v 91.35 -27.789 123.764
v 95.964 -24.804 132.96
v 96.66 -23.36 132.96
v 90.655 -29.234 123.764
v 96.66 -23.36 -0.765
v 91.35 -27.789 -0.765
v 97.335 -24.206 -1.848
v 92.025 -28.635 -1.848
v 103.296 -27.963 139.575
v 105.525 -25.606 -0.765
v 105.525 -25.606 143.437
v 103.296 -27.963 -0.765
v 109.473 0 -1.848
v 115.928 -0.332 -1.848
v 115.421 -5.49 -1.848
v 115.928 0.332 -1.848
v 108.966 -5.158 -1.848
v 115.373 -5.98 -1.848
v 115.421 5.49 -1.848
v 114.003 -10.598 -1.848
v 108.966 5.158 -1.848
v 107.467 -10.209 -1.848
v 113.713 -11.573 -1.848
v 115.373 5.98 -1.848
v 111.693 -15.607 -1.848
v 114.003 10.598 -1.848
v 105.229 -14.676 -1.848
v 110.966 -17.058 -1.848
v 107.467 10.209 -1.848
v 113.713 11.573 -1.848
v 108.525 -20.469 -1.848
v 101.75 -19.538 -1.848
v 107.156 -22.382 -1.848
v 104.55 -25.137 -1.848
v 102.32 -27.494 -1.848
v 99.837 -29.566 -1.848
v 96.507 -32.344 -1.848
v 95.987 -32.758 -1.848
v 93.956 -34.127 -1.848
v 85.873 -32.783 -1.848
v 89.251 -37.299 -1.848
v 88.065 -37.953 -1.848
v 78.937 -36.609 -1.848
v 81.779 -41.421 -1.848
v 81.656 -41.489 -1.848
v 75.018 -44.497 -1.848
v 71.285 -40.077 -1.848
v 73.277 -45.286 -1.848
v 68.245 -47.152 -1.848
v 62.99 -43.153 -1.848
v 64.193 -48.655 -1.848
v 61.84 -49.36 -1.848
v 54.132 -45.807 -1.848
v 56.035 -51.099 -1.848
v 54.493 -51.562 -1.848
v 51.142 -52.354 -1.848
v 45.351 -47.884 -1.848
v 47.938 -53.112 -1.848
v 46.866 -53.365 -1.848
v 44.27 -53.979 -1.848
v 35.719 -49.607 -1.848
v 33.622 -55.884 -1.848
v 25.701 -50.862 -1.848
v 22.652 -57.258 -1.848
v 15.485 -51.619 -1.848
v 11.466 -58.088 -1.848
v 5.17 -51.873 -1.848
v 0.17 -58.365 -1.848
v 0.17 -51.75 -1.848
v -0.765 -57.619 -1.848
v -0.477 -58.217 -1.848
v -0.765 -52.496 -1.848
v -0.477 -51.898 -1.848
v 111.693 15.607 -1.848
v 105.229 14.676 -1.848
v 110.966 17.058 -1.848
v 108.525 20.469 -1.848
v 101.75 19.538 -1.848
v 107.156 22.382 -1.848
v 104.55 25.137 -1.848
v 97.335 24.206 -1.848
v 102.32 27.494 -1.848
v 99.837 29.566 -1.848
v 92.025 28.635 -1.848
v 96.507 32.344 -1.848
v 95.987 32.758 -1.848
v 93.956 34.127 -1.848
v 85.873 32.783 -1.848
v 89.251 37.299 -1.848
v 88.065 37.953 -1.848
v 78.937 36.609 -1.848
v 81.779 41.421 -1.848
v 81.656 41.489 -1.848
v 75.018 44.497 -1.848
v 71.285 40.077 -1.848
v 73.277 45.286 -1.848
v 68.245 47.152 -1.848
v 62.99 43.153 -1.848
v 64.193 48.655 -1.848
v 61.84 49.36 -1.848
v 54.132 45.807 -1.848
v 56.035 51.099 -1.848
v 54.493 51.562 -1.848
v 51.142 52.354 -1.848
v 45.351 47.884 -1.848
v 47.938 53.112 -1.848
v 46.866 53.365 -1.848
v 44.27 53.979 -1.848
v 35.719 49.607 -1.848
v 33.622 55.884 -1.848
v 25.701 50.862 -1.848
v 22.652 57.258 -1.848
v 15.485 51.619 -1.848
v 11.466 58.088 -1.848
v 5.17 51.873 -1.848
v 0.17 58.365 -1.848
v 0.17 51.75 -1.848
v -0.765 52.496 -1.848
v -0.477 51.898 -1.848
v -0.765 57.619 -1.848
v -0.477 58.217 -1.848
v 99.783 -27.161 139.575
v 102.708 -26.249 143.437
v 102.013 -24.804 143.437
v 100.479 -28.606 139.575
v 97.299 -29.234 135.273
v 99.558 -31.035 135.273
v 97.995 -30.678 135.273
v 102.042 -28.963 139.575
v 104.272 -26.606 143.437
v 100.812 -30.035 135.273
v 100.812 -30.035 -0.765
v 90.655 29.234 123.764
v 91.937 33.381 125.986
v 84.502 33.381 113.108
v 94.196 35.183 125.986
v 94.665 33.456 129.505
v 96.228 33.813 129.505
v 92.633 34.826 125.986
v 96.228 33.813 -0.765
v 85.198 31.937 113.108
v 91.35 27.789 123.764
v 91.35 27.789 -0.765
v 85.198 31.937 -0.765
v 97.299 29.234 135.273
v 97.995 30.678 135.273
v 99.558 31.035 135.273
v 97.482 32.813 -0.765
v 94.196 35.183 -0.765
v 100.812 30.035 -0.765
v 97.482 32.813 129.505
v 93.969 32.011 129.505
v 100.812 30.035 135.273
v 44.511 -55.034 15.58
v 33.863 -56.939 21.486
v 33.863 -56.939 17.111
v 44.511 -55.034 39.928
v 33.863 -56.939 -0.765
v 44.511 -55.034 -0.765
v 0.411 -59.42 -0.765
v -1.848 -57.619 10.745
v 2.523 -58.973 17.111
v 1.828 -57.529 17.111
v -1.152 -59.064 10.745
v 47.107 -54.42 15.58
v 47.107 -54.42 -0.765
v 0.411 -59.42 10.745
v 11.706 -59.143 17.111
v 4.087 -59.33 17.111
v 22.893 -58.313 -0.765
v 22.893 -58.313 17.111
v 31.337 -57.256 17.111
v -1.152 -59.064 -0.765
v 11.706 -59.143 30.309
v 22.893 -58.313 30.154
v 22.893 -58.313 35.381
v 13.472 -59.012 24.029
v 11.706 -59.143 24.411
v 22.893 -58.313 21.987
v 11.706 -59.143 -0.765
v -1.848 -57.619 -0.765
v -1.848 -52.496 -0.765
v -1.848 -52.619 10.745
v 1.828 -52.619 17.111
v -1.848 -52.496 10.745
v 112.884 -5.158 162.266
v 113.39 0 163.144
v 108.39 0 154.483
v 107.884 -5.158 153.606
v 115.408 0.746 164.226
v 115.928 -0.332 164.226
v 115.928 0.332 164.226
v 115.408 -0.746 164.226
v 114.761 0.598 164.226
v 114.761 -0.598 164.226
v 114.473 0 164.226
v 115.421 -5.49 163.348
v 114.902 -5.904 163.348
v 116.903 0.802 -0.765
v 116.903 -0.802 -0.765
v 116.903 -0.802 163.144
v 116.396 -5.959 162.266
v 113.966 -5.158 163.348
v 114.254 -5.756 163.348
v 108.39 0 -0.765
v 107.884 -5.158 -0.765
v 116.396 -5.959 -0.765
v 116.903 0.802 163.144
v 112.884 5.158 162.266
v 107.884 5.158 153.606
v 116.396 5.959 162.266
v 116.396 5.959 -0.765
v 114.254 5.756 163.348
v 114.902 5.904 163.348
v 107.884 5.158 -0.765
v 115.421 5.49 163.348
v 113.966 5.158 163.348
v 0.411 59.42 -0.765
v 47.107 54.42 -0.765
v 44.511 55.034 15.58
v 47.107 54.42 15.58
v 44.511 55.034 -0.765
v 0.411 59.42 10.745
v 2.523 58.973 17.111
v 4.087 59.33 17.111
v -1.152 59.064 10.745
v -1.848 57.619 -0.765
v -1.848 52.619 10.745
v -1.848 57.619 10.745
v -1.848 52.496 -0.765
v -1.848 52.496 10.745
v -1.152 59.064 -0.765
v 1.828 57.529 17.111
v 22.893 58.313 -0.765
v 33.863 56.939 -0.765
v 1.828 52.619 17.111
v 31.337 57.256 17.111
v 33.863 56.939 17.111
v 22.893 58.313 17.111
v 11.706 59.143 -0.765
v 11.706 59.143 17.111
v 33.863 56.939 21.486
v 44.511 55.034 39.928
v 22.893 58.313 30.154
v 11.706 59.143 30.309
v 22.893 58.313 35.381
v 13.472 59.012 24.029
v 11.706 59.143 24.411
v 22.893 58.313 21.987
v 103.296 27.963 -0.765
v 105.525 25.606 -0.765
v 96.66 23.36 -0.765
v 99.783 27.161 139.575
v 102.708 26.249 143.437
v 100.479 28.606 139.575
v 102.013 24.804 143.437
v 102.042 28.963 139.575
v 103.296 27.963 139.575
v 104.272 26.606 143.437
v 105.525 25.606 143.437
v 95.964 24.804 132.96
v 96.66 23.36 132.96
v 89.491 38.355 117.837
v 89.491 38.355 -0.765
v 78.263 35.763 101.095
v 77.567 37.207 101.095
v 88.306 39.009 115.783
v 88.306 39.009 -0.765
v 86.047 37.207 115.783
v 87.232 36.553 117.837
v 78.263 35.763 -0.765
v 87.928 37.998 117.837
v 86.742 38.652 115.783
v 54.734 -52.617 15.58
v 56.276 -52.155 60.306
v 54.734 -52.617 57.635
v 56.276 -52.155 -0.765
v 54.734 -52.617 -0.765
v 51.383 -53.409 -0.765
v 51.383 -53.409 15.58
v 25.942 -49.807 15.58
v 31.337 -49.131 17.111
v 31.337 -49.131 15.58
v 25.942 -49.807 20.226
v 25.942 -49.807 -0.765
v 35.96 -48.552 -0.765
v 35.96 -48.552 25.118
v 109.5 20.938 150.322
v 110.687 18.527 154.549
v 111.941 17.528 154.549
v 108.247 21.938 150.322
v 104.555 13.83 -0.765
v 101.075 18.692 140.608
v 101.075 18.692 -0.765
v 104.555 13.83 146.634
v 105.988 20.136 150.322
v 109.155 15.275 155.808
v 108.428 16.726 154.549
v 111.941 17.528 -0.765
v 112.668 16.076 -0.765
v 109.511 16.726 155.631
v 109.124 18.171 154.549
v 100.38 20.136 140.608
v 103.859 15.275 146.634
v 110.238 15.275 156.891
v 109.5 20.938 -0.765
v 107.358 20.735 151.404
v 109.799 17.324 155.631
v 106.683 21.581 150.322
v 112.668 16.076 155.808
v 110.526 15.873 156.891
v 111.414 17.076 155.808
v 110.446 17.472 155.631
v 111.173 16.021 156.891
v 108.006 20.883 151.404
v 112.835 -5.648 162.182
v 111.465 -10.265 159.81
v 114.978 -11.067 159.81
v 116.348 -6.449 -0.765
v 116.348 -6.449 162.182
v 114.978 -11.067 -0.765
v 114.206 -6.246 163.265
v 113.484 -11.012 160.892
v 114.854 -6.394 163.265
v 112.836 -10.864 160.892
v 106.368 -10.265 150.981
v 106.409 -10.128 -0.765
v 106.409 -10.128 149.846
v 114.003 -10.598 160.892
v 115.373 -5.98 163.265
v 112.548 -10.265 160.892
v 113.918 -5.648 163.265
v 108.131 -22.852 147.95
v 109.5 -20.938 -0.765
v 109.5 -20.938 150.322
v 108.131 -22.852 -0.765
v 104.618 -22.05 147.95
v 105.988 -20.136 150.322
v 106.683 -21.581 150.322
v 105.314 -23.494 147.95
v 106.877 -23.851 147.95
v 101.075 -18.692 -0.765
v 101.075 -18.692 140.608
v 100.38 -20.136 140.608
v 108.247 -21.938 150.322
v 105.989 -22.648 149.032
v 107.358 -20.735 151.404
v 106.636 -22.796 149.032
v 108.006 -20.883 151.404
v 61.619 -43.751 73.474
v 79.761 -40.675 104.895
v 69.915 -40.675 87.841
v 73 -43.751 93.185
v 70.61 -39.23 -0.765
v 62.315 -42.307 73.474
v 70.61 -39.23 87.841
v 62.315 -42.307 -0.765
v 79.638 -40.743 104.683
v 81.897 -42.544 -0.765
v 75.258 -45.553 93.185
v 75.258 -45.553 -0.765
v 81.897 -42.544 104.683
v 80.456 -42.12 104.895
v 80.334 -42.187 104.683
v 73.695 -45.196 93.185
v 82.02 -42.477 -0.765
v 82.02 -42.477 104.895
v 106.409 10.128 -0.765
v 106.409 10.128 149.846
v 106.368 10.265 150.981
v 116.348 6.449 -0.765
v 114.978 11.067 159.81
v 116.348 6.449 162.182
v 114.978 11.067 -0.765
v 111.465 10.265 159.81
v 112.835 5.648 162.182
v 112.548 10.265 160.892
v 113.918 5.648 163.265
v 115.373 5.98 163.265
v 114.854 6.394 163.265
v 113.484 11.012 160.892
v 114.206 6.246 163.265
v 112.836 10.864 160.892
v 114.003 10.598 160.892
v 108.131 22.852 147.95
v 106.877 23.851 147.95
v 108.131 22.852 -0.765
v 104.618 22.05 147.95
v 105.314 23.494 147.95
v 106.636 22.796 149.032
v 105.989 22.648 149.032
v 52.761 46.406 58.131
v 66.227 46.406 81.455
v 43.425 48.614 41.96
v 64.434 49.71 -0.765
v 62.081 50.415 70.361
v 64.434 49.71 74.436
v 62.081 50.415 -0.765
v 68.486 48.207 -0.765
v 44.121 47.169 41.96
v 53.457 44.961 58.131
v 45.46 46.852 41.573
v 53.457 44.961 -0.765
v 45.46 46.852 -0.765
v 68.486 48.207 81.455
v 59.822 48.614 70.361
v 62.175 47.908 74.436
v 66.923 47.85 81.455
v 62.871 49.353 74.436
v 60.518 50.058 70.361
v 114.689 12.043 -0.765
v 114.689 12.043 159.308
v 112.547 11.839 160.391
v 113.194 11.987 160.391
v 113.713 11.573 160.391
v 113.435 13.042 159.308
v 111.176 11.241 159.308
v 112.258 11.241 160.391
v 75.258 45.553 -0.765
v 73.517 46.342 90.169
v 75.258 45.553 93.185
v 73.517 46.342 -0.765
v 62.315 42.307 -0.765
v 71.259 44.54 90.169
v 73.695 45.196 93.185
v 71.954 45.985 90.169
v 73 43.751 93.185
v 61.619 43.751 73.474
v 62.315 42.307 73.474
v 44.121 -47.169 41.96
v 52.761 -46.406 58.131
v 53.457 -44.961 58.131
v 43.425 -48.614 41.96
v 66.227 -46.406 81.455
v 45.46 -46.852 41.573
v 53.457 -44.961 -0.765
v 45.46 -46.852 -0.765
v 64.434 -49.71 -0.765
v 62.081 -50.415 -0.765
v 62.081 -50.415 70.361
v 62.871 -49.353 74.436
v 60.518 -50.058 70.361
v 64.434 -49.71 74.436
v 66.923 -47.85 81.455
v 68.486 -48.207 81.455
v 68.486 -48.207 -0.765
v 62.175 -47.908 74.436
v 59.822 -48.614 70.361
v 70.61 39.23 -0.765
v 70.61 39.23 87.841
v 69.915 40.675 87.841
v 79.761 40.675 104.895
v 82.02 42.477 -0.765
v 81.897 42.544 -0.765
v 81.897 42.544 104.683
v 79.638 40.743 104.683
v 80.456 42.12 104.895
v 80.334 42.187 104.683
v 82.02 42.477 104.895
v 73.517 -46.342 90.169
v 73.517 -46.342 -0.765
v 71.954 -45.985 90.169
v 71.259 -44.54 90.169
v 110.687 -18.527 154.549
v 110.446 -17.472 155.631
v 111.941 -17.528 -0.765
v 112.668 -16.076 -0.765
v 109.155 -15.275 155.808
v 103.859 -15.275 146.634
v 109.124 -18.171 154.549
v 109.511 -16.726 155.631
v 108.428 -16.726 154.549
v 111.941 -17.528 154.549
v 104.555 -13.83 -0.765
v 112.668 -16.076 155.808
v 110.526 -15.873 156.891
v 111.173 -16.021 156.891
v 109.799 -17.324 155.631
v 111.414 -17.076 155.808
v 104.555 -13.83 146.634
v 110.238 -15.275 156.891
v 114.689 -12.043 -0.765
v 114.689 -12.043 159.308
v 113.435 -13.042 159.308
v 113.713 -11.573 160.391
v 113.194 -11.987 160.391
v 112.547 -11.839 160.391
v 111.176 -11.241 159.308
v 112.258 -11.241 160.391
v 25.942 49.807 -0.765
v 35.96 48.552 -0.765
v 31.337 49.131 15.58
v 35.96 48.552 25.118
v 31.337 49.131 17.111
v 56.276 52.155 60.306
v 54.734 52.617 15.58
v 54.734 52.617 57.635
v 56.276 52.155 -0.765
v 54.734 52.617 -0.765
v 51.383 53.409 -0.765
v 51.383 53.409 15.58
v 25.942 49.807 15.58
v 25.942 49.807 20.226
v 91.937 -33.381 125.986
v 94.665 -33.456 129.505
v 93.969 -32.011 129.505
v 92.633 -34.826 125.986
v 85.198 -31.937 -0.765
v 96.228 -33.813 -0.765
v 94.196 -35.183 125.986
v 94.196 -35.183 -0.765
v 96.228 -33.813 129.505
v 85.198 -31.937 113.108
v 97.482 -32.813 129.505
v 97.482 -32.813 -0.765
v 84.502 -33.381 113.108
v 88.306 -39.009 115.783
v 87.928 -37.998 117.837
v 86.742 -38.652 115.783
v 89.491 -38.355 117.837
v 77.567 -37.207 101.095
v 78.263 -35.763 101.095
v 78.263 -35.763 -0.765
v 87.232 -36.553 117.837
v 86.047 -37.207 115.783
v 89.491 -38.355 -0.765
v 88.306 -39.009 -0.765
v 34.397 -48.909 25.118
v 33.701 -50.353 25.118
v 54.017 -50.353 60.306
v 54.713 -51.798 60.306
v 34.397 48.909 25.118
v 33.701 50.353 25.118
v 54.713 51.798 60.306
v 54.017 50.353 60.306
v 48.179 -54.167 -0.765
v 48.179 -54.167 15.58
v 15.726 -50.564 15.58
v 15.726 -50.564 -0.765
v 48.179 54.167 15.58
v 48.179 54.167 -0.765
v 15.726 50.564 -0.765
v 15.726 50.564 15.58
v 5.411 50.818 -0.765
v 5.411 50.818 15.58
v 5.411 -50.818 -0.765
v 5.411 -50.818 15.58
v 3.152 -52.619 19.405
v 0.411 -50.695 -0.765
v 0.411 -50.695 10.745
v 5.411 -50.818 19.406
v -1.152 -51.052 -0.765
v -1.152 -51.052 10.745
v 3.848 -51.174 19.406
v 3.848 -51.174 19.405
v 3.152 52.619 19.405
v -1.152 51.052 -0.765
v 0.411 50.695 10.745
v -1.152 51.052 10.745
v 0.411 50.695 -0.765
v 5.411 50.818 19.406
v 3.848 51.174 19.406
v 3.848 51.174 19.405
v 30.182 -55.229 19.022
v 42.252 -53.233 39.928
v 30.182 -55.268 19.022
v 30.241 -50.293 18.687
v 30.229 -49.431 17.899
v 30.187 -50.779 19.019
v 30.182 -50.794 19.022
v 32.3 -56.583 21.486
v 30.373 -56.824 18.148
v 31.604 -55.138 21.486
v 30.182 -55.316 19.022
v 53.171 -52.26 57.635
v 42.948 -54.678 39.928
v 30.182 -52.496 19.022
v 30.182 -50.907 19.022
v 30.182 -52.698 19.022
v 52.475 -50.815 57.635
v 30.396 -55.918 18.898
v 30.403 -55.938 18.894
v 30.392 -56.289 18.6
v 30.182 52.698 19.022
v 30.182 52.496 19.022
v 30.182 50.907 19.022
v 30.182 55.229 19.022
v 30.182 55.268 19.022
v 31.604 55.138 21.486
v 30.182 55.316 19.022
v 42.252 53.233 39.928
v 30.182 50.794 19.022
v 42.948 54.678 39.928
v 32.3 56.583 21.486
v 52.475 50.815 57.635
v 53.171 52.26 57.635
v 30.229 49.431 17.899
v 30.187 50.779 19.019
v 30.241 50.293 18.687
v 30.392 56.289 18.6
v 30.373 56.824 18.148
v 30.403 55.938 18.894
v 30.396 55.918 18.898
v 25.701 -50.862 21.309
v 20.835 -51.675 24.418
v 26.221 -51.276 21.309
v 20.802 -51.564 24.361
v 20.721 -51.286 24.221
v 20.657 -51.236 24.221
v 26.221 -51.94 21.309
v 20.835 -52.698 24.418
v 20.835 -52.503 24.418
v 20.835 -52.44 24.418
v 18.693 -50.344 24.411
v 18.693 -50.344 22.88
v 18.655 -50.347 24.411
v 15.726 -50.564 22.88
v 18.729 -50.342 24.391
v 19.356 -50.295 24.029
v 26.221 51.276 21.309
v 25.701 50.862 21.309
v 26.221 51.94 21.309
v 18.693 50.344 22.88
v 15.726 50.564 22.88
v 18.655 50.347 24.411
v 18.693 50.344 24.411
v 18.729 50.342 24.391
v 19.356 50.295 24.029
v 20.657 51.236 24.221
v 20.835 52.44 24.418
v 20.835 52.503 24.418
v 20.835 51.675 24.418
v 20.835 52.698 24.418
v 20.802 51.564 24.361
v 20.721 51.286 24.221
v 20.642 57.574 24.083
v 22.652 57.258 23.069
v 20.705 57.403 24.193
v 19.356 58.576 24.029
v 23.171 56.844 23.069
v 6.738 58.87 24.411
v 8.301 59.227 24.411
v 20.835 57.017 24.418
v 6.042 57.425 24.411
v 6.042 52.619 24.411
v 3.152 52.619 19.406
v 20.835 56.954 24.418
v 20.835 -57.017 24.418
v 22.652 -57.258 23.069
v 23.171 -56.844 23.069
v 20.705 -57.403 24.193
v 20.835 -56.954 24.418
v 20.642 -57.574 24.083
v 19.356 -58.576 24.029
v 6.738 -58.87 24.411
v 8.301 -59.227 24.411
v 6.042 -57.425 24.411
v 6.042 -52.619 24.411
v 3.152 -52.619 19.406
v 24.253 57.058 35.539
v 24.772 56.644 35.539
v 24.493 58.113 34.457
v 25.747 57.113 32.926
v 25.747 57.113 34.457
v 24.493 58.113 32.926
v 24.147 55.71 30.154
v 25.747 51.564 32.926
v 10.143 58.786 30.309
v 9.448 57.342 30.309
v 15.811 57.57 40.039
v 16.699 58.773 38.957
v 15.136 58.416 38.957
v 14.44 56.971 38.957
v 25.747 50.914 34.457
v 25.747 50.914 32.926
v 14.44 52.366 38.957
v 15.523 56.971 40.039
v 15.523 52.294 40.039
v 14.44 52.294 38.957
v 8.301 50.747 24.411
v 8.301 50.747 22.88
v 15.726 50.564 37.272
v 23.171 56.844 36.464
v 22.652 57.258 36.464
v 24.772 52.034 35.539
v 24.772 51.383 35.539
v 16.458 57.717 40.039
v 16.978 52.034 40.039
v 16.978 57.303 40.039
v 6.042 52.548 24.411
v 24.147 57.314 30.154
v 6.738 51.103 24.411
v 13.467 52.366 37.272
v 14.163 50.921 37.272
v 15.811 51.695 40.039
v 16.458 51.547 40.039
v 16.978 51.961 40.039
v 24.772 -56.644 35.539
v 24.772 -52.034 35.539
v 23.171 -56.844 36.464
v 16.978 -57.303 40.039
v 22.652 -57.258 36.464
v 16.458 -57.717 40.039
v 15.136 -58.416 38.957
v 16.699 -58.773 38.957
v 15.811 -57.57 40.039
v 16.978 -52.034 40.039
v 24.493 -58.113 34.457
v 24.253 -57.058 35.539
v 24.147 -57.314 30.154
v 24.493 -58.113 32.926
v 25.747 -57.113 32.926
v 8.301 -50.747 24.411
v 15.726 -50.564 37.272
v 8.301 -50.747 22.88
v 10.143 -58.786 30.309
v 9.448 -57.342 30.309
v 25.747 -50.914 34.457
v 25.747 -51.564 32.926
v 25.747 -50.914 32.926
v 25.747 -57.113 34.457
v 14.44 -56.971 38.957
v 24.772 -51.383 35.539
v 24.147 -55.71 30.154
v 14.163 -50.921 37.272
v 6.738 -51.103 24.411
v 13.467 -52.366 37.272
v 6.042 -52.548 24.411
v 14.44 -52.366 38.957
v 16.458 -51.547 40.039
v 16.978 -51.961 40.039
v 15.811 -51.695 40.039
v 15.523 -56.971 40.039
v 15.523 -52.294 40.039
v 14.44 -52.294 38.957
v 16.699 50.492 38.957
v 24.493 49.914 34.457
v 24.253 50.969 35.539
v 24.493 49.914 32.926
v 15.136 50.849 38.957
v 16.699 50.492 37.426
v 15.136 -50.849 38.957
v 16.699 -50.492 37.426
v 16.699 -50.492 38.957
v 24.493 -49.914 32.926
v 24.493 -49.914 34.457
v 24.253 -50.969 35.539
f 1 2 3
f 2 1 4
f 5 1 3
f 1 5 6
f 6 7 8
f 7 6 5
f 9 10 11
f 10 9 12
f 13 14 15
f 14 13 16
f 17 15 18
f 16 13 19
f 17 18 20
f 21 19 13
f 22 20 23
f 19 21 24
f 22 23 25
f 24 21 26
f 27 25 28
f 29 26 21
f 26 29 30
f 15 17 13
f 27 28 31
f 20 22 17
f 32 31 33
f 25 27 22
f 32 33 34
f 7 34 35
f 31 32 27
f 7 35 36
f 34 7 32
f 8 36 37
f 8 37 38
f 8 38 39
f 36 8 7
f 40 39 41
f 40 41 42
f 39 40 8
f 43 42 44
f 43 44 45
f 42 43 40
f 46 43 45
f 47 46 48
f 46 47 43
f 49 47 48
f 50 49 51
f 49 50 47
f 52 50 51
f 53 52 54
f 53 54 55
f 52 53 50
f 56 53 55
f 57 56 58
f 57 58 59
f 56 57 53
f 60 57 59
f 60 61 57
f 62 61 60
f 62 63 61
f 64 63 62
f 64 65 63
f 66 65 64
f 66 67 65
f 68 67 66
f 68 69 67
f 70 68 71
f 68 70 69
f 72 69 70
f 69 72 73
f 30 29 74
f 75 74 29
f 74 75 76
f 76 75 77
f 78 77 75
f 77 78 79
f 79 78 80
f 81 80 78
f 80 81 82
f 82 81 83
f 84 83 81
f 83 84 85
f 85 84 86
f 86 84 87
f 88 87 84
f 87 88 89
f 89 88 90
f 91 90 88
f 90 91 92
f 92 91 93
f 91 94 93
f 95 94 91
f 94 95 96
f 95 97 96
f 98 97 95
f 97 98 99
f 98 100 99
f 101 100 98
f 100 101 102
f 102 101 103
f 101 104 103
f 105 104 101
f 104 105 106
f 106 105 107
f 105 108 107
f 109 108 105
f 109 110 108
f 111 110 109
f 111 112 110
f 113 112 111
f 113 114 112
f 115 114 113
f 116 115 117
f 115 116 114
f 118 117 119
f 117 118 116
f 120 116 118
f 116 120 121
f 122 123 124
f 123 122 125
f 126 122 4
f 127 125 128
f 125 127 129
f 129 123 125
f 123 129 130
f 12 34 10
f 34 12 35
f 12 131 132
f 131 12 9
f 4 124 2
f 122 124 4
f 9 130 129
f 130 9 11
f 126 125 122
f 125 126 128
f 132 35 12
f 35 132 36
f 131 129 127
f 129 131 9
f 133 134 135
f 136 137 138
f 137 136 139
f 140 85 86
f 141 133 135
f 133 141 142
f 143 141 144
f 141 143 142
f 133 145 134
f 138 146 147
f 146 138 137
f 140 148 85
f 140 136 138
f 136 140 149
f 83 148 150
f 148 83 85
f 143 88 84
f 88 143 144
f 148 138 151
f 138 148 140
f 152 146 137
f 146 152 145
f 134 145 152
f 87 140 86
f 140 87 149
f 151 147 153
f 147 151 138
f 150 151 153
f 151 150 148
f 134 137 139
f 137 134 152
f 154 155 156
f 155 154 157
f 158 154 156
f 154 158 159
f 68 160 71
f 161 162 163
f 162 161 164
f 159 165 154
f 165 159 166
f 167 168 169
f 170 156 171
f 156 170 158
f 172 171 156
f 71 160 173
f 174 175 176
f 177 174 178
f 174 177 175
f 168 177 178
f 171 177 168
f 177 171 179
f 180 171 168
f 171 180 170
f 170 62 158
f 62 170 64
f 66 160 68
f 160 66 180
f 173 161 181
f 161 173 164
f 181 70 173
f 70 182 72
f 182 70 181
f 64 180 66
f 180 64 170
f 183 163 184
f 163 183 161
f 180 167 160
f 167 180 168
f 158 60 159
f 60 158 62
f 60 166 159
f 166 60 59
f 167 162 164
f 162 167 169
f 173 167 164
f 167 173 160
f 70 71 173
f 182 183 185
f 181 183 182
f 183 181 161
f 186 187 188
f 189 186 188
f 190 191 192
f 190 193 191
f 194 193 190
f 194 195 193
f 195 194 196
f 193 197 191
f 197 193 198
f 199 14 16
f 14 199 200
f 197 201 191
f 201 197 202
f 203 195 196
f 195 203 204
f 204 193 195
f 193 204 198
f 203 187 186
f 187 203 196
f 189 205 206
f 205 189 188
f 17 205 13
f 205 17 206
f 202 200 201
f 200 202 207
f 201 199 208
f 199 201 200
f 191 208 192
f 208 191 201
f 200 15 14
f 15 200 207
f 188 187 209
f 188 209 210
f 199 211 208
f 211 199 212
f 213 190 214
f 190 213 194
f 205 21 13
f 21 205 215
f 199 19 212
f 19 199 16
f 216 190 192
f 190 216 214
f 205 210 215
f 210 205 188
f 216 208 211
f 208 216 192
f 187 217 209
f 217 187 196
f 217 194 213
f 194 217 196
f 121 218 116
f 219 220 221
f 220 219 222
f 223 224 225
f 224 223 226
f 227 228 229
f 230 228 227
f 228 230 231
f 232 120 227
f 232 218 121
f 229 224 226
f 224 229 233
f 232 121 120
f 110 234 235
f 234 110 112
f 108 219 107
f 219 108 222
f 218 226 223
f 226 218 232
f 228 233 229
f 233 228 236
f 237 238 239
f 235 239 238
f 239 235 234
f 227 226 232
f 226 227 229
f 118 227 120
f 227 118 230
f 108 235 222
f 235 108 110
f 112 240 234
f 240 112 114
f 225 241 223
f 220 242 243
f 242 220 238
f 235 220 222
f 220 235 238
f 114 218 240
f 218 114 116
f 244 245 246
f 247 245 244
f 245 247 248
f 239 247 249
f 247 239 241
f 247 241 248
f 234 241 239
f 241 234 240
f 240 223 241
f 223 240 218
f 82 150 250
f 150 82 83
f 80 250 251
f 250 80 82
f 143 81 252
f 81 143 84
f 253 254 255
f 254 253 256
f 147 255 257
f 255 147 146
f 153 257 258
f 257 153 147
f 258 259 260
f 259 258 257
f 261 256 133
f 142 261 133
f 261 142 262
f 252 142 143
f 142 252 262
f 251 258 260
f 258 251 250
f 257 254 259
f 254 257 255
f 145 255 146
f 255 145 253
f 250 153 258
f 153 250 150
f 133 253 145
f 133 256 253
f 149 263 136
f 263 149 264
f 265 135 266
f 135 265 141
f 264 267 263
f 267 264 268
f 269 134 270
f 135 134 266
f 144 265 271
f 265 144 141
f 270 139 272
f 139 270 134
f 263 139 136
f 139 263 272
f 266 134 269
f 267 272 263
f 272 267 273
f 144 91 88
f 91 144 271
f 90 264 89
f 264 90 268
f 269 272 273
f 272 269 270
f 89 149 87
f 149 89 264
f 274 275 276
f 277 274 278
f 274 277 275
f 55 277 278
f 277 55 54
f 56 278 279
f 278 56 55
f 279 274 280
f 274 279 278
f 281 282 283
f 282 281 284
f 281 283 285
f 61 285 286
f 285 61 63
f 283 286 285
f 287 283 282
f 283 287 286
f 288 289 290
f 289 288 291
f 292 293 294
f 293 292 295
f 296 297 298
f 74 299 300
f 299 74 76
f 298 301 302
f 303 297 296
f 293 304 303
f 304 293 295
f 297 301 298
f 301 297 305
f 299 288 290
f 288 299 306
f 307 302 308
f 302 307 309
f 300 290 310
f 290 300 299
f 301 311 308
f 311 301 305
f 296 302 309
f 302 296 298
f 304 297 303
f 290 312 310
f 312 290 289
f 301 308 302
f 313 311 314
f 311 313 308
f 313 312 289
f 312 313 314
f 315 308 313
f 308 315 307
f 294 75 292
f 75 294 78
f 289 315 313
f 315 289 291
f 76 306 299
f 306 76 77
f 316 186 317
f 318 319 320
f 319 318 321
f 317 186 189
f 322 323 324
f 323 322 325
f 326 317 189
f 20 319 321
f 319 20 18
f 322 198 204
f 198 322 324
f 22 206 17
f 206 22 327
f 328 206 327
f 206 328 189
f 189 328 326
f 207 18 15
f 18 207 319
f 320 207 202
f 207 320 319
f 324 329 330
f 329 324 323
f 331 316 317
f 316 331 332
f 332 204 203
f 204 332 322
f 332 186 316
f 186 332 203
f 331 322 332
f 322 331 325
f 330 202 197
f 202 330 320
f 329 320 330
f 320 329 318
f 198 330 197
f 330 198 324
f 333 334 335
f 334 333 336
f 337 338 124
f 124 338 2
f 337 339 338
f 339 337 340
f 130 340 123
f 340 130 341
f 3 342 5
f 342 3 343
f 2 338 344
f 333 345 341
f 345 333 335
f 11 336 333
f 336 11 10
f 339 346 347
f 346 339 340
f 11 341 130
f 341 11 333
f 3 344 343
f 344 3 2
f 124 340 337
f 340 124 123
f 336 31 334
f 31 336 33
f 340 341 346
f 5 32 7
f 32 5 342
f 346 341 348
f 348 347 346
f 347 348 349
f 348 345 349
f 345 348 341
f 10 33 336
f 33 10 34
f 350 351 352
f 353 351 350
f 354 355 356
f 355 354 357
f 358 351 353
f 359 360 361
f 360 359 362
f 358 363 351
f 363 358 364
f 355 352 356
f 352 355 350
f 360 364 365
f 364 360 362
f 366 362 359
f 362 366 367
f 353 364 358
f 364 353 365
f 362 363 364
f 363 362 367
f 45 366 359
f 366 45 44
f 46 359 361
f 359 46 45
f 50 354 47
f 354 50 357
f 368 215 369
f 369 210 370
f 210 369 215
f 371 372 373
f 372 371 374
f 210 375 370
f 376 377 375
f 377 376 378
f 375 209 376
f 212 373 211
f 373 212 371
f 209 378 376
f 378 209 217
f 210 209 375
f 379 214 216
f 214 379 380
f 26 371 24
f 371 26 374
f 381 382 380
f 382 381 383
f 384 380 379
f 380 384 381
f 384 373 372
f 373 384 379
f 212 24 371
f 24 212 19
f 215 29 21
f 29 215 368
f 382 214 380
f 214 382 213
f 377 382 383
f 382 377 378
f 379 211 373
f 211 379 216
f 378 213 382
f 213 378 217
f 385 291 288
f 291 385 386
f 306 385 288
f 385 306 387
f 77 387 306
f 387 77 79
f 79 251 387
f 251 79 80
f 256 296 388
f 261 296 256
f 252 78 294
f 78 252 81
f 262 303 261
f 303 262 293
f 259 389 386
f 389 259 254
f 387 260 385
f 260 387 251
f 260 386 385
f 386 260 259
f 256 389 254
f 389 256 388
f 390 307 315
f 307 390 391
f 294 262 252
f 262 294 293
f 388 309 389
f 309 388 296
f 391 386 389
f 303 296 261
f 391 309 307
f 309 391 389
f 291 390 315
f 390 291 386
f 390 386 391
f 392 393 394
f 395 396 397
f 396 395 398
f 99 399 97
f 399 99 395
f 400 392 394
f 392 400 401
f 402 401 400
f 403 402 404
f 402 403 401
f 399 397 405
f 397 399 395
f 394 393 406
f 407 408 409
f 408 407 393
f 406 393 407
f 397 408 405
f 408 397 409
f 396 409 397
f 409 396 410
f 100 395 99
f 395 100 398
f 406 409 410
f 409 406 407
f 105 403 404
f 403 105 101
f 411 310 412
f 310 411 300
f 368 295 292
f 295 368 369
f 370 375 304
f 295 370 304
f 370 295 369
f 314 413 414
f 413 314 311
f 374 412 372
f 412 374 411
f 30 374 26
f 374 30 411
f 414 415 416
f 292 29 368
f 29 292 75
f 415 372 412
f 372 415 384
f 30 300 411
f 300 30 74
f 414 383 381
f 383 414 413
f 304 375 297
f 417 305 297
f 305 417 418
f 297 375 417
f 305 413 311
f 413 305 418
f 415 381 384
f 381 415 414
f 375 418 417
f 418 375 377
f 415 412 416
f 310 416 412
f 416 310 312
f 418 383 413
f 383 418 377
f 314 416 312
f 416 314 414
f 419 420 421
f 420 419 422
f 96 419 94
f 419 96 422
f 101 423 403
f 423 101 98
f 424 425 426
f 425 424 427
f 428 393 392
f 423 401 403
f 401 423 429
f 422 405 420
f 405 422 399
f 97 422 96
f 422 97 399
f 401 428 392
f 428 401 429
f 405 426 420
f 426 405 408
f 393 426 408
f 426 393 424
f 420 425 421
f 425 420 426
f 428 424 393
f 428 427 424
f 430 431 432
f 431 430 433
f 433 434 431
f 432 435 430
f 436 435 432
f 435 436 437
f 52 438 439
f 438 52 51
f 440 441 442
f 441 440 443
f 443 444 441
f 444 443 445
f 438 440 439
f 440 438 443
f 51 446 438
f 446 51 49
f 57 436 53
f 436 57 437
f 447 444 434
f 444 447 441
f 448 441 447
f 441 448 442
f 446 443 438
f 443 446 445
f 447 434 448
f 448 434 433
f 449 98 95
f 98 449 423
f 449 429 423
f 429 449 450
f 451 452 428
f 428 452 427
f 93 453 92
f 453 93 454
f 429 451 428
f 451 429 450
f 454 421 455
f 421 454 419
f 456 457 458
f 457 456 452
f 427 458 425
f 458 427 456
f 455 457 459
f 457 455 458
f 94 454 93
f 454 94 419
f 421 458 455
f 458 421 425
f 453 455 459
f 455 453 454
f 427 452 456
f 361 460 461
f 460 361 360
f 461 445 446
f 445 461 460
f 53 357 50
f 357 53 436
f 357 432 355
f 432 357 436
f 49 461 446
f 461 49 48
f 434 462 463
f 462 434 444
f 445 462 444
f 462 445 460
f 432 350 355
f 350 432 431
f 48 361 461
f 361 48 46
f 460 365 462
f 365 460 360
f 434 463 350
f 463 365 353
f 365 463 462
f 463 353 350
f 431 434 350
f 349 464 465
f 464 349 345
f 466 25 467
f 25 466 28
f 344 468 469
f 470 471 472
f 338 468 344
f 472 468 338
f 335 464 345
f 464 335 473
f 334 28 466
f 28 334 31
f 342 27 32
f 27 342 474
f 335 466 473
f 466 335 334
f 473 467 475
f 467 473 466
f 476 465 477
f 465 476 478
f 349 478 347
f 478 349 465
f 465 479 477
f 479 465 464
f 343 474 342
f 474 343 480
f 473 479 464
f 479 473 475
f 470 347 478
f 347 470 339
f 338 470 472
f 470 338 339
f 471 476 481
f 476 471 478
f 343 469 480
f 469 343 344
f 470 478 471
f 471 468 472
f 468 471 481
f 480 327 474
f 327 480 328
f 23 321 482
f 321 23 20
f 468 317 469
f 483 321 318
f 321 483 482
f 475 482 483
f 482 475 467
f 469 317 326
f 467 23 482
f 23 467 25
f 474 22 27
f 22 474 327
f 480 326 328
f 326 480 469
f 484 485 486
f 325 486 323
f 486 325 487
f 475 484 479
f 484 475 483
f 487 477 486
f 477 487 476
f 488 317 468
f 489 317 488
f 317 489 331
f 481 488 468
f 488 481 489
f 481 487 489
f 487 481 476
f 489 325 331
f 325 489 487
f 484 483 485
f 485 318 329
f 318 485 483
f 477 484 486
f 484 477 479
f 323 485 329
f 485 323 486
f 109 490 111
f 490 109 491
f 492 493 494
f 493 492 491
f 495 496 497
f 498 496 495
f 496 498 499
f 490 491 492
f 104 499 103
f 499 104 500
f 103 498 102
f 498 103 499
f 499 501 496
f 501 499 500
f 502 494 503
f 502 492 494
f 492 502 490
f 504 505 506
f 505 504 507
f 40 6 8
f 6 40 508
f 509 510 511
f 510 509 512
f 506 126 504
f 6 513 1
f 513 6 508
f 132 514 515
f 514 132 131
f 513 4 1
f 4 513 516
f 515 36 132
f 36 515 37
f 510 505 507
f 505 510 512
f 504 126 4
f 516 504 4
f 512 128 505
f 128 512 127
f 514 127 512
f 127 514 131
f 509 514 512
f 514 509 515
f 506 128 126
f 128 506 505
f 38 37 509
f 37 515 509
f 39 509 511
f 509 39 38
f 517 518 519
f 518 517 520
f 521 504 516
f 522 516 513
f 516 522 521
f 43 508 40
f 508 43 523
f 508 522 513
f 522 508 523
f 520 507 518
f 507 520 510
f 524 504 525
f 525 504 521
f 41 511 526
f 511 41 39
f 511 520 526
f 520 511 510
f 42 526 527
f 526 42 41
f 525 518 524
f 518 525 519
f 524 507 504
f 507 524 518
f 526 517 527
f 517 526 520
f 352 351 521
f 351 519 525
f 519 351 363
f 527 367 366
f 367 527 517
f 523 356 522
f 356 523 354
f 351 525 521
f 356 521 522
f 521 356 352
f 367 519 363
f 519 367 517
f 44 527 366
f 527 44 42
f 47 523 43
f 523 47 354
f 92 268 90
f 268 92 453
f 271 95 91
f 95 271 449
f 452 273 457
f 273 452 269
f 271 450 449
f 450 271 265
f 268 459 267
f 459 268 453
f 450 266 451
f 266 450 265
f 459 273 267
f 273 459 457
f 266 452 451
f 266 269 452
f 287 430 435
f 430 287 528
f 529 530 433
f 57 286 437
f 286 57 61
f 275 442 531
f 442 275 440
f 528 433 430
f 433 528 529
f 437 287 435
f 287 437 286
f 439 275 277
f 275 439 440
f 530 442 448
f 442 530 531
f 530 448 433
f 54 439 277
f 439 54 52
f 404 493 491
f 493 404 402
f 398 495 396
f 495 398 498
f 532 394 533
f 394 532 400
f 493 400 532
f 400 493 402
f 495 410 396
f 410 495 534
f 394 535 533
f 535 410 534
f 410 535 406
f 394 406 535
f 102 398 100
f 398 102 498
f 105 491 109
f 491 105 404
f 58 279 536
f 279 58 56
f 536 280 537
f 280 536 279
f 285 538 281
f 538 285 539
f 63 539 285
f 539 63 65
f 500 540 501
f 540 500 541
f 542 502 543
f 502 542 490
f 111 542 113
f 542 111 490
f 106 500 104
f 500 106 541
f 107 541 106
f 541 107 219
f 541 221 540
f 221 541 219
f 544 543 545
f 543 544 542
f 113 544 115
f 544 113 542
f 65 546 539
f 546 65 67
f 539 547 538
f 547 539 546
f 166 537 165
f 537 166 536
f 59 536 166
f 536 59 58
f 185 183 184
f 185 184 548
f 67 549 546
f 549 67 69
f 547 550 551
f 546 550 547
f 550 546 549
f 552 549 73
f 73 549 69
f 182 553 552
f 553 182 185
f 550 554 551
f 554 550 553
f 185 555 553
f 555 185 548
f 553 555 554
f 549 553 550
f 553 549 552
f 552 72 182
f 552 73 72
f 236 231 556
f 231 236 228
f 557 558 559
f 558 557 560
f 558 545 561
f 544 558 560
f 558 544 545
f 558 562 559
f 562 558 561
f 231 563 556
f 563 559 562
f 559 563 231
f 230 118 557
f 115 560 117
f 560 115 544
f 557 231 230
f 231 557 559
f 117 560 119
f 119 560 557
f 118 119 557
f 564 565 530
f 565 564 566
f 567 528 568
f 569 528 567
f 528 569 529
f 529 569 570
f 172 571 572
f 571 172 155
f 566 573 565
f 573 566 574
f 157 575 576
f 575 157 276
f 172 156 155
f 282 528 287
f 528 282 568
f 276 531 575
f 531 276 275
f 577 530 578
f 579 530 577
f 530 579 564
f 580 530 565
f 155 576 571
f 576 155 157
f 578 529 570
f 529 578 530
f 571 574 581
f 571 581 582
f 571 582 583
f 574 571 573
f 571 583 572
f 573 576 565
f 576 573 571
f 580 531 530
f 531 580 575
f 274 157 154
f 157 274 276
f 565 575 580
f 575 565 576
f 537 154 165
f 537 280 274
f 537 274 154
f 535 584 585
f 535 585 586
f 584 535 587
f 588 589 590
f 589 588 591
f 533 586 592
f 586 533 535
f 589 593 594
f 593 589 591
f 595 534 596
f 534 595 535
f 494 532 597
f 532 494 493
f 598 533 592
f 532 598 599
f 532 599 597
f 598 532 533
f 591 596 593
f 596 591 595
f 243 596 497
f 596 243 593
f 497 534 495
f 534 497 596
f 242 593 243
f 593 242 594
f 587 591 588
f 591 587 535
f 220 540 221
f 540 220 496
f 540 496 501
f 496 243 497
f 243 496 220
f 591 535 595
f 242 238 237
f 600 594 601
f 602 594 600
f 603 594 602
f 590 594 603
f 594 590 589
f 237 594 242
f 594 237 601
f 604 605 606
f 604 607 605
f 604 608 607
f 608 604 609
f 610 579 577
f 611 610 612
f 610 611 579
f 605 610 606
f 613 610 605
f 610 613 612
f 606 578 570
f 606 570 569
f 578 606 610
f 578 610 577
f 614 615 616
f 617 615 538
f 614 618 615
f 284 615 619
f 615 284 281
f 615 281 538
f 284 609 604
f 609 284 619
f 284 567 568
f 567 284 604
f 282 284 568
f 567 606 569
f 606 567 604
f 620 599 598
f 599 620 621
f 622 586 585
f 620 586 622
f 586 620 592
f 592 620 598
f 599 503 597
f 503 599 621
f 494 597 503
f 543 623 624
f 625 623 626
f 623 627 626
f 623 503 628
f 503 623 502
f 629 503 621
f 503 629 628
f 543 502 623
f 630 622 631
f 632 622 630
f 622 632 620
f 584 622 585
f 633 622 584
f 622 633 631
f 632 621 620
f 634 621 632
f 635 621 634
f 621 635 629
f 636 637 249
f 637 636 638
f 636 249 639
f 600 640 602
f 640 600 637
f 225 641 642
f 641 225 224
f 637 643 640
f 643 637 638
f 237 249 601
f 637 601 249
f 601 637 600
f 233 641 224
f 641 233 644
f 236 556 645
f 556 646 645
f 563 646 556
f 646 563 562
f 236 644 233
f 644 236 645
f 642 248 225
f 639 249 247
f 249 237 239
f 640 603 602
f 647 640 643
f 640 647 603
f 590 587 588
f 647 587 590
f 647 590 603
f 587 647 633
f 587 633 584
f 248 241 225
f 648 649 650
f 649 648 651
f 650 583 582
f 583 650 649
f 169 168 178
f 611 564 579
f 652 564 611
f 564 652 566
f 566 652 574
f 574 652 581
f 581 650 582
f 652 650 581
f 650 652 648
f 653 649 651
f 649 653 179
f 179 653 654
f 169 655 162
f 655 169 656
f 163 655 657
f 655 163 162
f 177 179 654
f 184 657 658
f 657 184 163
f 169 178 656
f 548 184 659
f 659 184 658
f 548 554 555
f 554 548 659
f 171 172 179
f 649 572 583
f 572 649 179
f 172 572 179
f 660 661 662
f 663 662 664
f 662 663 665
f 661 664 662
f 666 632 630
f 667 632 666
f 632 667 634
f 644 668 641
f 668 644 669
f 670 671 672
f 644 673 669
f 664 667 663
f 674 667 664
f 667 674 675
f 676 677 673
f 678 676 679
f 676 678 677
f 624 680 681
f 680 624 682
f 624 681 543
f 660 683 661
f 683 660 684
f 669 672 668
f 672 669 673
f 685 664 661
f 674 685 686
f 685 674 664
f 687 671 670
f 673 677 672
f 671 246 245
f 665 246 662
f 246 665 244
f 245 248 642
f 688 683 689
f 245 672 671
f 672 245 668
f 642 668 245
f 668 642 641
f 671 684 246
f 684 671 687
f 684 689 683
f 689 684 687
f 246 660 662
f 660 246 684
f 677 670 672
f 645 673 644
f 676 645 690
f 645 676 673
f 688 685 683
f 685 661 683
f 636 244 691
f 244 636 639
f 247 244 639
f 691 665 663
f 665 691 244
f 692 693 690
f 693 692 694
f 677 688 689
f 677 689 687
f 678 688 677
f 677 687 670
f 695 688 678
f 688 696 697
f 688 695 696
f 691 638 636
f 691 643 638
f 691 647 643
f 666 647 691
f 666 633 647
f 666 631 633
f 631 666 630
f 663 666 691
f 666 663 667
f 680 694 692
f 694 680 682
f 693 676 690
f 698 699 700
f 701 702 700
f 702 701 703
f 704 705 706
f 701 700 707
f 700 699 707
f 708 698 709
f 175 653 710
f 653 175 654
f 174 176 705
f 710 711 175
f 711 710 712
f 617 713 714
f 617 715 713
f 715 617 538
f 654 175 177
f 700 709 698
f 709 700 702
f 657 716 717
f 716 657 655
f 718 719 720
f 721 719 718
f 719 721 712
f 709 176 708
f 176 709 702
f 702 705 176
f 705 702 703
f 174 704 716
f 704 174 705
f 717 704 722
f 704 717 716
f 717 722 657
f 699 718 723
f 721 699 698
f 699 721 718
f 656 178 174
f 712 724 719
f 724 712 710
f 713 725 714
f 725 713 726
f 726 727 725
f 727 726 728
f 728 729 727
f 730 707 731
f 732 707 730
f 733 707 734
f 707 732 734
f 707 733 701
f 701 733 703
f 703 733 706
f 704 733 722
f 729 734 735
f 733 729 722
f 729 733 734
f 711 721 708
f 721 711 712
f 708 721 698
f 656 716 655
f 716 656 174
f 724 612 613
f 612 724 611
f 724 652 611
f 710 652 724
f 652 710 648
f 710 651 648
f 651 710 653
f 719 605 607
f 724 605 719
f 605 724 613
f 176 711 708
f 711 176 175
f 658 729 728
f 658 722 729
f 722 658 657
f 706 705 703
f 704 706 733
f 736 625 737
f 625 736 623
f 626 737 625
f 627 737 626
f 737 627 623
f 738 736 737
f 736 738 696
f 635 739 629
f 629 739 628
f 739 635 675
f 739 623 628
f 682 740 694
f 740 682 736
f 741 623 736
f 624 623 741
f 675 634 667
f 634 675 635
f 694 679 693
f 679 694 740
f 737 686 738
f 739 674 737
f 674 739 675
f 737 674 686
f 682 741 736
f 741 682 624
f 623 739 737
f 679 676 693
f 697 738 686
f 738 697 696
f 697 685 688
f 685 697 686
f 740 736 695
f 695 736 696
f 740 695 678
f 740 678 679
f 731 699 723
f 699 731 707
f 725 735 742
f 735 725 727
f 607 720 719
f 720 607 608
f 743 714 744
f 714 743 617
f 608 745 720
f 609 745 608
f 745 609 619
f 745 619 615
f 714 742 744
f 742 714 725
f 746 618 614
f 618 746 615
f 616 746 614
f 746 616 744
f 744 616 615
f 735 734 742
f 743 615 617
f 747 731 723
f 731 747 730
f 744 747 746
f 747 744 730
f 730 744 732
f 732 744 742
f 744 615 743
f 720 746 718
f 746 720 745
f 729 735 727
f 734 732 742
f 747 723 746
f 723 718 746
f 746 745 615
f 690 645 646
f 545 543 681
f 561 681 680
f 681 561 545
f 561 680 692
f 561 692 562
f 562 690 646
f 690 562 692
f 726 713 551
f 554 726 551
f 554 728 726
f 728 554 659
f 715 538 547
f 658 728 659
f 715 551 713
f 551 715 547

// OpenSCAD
//iPad Retina
x=242;	//height of tablet
y=186;	//width of tablet
z=9.5;		//thickness of tablet

//iPad2
x=242;	//height of tablet
y=186;	//width of tablet
z=9;		//thickness of tablet

/*
//Xperia Tablet Z
x=266;	//height of tablet
y=172;	//width of tablet
z=7;		//thickness of tablet
*/

w=x/2.1;	//width
t=5;	//thickness of stand
e=2;	//edge radius
p=z*1.4;	//pad thickness
a=30;	//pad angle

//----------
te=t-e;	//thickness without edge radius
r=w/2;

module base(){
		difference(){
			scale([2,1,1])	cylinder(h=w*2.5,r=r, $fn=64);
			translate([-t,0,-1]) scale([2,1,1]) cylinder(h=w*2.5+2,r=r-t, $fn=64);
			translate([0,-w,-1])	cube([w*3,w*2,w*3]);
		}
}

module cut(){
	translate([w/20,-w,0]) 	rotate([0,-a,0])	{
		cube([w*3,w*2,w*3]);
		translate([-p-t,0,p*3.5]) cube([w*3,w*2,w*3]);
		translate([-p-t-e*3,0,p*2.5+1])	cube([p+e,w*2,w*3]);
	}
}

module stand(){
	minkowski(){
		sphere(e);
		difference(){
			base();
			cut();
		}
	}
}

//pad dummy
% rotate([0,0,180]) translate([-p*2-t,-y/2,p+t]) rotate([0,-a,0]) cube([z,y,x]);

rotate([0,0,180]) stand();
